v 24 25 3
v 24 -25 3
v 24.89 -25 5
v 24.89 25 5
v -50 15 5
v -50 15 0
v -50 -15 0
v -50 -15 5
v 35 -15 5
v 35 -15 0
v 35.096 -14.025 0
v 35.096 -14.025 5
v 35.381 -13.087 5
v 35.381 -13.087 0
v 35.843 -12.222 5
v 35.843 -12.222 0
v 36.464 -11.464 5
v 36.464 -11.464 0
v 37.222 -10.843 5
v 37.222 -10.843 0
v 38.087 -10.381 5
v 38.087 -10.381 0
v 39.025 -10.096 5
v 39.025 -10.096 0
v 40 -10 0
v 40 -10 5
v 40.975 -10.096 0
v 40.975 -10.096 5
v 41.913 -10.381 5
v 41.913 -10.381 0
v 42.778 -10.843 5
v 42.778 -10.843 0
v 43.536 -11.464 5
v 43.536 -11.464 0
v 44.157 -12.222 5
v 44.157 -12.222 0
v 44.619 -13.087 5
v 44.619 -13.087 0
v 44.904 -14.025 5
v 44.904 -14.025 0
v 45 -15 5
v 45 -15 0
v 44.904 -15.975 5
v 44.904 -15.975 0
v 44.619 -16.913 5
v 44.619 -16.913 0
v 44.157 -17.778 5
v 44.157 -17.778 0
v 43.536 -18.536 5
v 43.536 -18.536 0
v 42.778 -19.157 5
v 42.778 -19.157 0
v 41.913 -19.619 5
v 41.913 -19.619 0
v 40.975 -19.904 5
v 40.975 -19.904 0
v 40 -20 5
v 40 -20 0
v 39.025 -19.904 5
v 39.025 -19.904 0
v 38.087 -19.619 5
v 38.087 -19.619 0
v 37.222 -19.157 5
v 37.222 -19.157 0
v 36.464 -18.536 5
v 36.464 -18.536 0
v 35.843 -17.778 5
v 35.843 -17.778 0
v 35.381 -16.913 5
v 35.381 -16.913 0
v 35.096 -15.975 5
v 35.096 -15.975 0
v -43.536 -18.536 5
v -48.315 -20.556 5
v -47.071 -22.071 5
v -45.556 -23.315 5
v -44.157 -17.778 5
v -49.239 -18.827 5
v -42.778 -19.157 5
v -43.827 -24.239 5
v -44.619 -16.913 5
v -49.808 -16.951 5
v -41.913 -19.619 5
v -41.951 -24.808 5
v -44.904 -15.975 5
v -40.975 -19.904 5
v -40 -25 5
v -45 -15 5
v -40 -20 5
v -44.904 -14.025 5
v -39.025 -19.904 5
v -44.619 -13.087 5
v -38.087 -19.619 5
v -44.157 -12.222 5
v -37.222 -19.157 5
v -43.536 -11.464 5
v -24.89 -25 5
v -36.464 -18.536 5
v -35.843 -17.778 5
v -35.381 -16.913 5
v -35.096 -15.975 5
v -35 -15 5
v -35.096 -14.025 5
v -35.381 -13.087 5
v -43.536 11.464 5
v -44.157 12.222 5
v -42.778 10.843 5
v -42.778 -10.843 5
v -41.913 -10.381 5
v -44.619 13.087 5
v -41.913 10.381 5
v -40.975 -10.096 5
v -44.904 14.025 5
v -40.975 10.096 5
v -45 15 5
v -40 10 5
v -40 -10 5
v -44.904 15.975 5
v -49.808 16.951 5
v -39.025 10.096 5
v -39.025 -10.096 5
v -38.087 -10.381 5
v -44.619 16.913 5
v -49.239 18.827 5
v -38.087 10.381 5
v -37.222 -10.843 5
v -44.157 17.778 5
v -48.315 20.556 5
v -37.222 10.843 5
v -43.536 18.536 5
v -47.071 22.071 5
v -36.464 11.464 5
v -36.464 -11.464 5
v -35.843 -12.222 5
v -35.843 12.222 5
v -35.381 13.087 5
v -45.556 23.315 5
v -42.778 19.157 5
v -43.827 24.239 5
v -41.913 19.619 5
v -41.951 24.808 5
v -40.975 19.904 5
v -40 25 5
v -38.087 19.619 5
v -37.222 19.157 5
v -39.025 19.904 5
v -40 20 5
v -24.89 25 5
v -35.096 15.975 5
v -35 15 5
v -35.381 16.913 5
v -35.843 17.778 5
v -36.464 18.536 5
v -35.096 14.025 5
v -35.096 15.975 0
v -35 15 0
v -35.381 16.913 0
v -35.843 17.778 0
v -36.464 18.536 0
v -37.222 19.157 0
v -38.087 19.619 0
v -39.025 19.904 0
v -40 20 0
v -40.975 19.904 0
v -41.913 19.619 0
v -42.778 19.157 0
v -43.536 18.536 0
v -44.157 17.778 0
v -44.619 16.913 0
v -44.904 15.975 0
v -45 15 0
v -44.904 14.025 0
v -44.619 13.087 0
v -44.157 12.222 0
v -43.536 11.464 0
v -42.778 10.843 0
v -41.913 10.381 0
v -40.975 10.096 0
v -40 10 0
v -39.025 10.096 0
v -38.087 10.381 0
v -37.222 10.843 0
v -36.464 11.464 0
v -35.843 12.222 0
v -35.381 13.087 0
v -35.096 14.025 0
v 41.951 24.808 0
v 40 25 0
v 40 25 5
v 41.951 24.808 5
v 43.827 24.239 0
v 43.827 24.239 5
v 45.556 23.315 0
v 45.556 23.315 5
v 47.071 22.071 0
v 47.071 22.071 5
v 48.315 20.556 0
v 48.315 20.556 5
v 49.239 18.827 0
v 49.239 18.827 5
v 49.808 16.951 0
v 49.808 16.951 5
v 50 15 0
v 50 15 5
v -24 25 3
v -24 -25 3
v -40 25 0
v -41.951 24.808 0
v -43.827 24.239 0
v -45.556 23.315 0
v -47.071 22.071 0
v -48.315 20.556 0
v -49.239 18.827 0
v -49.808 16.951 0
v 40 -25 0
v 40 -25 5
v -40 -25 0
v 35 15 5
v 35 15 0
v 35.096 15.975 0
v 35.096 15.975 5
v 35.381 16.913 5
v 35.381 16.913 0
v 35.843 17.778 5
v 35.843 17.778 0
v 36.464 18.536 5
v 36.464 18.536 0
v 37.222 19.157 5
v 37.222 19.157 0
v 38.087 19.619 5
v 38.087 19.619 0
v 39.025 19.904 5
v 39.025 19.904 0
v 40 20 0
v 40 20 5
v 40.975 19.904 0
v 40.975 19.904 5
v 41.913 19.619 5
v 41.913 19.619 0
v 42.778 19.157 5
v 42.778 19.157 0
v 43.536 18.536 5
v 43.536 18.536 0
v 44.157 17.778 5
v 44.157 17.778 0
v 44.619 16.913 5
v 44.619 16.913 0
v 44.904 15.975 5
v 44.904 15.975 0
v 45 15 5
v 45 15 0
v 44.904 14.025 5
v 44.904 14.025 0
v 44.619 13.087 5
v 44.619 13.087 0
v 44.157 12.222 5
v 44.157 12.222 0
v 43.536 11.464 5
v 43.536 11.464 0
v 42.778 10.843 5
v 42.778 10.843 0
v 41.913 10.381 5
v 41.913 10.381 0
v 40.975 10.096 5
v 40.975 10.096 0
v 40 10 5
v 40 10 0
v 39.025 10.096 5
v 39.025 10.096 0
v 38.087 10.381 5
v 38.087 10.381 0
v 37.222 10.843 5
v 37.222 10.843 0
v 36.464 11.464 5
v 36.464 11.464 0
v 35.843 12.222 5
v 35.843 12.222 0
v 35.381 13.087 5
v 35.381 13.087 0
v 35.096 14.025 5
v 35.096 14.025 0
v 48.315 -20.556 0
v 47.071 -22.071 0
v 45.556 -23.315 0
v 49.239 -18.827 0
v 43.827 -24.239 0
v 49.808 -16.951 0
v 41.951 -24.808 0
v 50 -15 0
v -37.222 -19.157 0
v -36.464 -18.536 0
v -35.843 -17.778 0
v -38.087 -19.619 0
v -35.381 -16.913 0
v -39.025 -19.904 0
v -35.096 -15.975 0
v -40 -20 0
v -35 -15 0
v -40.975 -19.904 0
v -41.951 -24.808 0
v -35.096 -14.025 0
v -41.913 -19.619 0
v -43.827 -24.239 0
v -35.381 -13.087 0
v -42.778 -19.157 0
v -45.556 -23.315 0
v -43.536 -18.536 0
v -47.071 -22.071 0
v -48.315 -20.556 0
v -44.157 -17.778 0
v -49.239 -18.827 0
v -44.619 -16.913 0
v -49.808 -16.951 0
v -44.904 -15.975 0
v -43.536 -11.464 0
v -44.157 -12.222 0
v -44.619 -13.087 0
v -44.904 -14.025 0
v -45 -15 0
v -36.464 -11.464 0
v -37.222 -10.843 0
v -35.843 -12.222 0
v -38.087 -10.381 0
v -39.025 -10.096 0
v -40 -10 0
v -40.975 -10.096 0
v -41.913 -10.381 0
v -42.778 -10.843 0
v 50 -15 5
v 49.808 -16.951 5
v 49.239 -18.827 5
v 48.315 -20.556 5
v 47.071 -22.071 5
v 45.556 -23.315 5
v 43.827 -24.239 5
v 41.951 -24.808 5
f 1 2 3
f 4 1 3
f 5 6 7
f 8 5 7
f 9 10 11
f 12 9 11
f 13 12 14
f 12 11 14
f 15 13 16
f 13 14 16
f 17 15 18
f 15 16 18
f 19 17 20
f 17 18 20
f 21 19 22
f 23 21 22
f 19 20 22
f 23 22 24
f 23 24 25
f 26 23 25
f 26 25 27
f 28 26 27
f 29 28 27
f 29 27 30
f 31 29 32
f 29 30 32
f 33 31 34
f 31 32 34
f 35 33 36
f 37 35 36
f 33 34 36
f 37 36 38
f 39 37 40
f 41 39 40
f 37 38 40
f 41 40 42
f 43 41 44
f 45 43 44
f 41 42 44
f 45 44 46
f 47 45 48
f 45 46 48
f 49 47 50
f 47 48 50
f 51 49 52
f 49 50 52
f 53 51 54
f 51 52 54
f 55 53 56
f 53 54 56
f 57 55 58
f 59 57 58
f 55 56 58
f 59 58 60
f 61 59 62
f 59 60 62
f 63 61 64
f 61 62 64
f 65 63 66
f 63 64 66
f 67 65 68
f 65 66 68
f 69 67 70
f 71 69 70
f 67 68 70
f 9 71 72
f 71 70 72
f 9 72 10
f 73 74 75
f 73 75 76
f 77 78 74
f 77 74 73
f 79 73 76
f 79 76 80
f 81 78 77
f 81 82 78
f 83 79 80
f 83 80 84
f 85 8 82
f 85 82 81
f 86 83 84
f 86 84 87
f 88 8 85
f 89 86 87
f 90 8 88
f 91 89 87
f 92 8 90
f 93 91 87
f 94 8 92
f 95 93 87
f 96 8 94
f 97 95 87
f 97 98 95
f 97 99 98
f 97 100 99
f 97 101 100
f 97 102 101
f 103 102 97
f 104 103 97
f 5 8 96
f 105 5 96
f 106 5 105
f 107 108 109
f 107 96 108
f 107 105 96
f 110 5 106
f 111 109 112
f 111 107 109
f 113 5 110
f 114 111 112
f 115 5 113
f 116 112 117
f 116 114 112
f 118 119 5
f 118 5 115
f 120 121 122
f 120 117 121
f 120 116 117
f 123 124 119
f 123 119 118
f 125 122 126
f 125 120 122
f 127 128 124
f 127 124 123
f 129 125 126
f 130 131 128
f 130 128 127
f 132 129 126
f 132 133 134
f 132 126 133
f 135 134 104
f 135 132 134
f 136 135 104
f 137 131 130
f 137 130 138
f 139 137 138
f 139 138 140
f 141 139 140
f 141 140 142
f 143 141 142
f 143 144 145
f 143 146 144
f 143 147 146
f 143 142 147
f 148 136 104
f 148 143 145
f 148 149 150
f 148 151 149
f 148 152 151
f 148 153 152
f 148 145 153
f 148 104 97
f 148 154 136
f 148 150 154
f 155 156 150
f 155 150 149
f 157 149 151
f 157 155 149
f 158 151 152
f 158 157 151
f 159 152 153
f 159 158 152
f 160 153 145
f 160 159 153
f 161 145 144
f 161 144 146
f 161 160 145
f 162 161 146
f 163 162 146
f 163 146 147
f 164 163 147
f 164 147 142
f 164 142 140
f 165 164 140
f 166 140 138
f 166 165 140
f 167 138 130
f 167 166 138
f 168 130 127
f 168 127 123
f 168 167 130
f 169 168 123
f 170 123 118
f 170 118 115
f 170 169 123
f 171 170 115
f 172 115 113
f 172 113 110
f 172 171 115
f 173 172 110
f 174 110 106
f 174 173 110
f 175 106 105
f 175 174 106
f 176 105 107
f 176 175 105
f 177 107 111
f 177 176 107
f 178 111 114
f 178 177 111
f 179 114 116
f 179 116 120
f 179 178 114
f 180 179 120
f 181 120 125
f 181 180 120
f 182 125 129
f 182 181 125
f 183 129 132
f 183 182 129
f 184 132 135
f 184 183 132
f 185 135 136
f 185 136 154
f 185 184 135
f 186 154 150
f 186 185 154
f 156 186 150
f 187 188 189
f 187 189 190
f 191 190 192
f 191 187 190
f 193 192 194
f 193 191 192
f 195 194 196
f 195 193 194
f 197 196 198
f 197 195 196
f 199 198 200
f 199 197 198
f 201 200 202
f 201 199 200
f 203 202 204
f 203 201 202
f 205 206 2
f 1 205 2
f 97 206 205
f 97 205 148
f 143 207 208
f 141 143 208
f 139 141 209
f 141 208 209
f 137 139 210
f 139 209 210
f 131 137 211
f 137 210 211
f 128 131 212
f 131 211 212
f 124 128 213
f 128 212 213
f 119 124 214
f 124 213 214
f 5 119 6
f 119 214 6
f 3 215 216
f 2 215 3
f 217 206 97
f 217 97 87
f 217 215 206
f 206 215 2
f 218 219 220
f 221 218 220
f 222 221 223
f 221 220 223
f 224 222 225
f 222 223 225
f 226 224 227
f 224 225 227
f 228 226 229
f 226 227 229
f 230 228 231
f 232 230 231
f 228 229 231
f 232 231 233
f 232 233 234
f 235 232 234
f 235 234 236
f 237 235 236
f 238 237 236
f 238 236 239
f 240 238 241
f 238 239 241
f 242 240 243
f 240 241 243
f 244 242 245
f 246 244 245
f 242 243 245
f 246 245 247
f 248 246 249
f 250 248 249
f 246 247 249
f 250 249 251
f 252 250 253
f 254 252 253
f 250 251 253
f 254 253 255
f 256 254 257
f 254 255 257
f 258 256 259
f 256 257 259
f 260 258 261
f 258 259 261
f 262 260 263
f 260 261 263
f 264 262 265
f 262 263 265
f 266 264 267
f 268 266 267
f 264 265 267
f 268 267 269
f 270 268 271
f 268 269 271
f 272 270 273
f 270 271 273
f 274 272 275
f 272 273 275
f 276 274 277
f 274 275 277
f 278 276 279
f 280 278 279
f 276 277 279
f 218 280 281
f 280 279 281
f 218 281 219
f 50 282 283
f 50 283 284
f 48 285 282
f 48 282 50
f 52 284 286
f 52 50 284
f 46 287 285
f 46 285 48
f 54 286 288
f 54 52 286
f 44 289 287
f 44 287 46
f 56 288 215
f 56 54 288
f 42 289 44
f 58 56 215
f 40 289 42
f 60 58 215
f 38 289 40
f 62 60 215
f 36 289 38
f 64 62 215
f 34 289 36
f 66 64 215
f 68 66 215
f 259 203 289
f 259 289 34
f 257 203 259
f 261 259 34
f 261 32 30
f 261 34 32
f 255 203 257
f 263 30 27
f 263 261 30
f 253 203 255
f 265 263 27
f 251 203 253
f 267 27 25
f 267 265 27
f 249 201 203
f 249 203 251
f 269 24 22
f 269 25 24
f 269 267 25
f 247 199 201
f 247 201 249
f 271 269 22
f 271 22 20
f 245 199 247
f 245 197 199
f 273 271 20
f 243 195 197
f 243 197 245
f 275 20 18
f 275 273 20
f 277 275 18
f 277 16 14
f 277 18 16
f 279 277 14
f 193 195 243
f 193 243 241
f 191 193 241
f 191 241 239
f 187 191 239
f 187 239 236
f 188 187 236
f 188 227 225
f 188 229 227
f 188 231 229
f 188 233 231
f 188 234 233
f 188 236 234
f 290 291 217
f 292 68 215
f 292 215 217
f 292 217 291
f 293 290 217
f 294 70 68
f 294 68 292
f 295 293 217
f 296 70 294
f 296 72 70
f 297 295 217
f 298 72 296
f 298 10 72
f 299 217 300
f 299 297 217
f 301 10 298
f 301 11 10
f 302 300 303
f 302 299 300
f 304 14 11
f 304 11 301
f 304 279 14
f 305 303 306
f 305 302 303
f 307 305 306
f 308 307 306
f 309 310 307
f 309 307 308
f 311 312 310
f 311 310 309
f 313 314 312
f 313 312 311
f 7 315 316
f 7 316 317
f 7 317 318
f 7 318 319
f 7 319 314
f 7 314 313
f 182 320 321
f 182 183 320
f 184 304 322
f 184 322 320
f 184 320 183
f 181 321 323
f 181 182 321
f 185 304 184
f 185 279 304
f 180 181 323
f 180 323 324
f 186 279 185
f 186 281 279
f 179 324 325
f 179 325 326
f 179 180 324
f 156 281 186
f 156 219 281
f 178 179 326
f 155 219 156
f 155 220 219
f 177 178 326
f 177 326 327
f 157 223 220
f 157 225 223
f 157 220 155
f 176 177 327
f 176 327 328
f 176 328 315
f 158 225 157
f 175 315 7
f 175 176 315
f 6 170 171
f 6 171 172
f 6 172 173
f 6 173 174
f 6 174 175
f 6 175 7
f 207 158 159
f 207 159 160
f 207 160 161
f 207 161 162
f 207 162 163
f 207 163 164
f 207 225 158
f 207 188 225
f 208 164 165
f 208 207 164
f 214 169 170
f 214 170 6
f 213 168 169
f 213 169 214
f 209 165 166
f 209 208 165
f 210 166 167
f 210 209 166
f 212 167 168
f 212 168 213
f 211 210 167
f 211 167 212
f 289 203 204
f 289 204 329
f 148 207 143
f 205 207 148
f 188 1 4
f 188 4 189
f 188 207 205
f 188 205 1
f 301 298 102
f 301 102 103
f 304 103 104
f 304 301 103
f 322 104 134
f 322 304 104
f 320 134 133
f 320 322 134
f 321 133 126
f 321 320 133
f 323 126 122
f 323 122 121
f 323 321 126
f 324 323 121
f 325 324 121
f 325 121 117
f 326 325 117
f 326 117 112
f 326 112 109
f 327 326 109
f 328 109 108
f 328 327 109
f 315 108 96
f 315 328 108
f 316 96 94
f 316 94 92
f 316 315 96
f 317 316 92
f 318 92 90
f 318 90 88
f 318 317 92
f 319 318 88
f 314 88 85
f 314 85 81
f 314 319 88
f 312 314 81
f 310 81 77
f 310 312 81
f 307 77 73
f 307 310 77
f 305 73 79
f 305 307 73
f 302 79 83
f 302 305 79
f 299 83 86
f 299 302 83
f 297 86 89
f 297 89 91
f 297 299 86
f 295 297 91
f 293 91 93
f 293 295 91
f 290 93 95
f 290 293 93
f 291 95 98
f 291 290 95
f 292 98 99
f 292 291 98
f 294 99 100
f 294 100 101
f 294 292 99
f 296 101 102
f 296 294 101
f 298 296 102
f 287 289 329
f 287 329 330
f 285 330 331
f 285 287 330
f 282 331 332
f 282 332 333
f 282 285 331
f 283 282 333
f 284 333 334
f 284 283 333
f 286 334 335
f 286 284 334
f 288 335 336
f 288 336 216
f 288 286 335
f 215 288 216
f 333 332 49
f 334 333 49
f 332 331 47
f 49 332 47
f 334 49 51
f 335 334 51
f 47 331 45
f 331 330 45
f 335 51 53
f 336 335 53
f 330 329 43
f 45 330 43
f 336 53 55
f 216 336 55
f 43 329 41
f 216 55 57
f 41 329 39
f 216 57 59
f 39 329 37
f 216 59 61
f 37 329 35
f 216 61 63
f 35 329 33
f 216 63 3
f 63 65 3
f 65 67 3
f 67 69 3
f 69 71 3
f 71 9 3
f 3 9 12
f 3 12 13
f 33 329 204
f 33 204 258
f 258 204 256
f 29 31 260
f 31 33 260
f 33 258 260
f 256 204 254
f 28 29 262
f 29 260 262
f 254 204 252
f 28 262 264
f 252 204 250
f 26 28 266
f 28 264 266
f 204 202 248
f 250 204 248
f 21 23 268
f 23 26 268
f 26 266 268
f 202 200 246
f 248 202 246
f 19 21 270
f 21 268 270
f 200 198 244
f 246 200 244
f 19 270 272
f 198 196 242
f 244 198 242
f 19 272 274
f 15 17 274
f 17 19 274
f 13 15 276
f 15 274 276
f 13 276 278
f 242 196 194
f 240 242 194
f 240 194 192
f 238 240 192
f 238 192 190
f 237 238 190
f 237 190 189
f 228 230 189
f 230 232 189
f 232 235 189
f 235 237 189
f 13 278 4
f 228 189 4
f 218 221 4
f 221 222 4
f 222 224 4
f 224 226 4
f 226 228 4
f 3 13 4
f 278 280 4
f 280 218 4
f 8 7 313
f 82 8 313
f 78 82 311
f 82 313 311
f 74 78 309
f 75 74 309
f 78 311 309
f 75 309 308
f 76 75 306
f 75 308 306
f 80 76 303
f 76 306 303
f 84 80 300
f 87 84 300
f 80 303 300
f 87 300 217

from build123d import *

# Parameters (mm, degrees)
SKETCH_R          = 5
PAD_DEPTH         = 5
POCKET_DEPTH      = 25.001
POCKET_DEPTH_BACK = 25.001


with BuildPart() as part:
    # Sketch → Pad (new body)
    with BuildSketch(Plane.XY):
        with BuildLine():
            Line((-50, 15), (-50, -15))
            ThreePointArc((-50, -15), (-47.071068, -22.071068), (-40, -25))
            Line((-40, -25), (0, -25))
            Line((0, -25), (0, 25))
            Line((0, 25), (-40, 25))
            ThreePointArc((-40, 25), (-47.071068, 22.071068), (-50, 15))
        make_face()
        with Locations((-40, 15)):
            Circle(SKETCH_R, mode=Mode.SUBTRACT)
        with Locations((-40, -15)):
            Circle(SKETCH_R, mode=Mode.SUBTRACT)
    extrude(amount=PAD_DEPTH)

    # Sketch001 → Pocket (cut, two sides)
    with BuildSketch(Plane.XZ) as pocket_sk:
        Polygon((0, 3), (-24, 3), (-24.890457, 5), (0, 5), align=None)
    extrude(amount=-POCKET_DEPTH, mode=Mode.SUBTRACT)
    extrude(pocket_sk.sketch, amount=POCKET_DEPTH_BACK, mode=Mode.SUBTRACT)

    # Mirrored: part across YZ


with BuildPart() as part_1:
    add(part.part)
    add(part.part.mirror(Plane.YZ))


solid = part_1.part
